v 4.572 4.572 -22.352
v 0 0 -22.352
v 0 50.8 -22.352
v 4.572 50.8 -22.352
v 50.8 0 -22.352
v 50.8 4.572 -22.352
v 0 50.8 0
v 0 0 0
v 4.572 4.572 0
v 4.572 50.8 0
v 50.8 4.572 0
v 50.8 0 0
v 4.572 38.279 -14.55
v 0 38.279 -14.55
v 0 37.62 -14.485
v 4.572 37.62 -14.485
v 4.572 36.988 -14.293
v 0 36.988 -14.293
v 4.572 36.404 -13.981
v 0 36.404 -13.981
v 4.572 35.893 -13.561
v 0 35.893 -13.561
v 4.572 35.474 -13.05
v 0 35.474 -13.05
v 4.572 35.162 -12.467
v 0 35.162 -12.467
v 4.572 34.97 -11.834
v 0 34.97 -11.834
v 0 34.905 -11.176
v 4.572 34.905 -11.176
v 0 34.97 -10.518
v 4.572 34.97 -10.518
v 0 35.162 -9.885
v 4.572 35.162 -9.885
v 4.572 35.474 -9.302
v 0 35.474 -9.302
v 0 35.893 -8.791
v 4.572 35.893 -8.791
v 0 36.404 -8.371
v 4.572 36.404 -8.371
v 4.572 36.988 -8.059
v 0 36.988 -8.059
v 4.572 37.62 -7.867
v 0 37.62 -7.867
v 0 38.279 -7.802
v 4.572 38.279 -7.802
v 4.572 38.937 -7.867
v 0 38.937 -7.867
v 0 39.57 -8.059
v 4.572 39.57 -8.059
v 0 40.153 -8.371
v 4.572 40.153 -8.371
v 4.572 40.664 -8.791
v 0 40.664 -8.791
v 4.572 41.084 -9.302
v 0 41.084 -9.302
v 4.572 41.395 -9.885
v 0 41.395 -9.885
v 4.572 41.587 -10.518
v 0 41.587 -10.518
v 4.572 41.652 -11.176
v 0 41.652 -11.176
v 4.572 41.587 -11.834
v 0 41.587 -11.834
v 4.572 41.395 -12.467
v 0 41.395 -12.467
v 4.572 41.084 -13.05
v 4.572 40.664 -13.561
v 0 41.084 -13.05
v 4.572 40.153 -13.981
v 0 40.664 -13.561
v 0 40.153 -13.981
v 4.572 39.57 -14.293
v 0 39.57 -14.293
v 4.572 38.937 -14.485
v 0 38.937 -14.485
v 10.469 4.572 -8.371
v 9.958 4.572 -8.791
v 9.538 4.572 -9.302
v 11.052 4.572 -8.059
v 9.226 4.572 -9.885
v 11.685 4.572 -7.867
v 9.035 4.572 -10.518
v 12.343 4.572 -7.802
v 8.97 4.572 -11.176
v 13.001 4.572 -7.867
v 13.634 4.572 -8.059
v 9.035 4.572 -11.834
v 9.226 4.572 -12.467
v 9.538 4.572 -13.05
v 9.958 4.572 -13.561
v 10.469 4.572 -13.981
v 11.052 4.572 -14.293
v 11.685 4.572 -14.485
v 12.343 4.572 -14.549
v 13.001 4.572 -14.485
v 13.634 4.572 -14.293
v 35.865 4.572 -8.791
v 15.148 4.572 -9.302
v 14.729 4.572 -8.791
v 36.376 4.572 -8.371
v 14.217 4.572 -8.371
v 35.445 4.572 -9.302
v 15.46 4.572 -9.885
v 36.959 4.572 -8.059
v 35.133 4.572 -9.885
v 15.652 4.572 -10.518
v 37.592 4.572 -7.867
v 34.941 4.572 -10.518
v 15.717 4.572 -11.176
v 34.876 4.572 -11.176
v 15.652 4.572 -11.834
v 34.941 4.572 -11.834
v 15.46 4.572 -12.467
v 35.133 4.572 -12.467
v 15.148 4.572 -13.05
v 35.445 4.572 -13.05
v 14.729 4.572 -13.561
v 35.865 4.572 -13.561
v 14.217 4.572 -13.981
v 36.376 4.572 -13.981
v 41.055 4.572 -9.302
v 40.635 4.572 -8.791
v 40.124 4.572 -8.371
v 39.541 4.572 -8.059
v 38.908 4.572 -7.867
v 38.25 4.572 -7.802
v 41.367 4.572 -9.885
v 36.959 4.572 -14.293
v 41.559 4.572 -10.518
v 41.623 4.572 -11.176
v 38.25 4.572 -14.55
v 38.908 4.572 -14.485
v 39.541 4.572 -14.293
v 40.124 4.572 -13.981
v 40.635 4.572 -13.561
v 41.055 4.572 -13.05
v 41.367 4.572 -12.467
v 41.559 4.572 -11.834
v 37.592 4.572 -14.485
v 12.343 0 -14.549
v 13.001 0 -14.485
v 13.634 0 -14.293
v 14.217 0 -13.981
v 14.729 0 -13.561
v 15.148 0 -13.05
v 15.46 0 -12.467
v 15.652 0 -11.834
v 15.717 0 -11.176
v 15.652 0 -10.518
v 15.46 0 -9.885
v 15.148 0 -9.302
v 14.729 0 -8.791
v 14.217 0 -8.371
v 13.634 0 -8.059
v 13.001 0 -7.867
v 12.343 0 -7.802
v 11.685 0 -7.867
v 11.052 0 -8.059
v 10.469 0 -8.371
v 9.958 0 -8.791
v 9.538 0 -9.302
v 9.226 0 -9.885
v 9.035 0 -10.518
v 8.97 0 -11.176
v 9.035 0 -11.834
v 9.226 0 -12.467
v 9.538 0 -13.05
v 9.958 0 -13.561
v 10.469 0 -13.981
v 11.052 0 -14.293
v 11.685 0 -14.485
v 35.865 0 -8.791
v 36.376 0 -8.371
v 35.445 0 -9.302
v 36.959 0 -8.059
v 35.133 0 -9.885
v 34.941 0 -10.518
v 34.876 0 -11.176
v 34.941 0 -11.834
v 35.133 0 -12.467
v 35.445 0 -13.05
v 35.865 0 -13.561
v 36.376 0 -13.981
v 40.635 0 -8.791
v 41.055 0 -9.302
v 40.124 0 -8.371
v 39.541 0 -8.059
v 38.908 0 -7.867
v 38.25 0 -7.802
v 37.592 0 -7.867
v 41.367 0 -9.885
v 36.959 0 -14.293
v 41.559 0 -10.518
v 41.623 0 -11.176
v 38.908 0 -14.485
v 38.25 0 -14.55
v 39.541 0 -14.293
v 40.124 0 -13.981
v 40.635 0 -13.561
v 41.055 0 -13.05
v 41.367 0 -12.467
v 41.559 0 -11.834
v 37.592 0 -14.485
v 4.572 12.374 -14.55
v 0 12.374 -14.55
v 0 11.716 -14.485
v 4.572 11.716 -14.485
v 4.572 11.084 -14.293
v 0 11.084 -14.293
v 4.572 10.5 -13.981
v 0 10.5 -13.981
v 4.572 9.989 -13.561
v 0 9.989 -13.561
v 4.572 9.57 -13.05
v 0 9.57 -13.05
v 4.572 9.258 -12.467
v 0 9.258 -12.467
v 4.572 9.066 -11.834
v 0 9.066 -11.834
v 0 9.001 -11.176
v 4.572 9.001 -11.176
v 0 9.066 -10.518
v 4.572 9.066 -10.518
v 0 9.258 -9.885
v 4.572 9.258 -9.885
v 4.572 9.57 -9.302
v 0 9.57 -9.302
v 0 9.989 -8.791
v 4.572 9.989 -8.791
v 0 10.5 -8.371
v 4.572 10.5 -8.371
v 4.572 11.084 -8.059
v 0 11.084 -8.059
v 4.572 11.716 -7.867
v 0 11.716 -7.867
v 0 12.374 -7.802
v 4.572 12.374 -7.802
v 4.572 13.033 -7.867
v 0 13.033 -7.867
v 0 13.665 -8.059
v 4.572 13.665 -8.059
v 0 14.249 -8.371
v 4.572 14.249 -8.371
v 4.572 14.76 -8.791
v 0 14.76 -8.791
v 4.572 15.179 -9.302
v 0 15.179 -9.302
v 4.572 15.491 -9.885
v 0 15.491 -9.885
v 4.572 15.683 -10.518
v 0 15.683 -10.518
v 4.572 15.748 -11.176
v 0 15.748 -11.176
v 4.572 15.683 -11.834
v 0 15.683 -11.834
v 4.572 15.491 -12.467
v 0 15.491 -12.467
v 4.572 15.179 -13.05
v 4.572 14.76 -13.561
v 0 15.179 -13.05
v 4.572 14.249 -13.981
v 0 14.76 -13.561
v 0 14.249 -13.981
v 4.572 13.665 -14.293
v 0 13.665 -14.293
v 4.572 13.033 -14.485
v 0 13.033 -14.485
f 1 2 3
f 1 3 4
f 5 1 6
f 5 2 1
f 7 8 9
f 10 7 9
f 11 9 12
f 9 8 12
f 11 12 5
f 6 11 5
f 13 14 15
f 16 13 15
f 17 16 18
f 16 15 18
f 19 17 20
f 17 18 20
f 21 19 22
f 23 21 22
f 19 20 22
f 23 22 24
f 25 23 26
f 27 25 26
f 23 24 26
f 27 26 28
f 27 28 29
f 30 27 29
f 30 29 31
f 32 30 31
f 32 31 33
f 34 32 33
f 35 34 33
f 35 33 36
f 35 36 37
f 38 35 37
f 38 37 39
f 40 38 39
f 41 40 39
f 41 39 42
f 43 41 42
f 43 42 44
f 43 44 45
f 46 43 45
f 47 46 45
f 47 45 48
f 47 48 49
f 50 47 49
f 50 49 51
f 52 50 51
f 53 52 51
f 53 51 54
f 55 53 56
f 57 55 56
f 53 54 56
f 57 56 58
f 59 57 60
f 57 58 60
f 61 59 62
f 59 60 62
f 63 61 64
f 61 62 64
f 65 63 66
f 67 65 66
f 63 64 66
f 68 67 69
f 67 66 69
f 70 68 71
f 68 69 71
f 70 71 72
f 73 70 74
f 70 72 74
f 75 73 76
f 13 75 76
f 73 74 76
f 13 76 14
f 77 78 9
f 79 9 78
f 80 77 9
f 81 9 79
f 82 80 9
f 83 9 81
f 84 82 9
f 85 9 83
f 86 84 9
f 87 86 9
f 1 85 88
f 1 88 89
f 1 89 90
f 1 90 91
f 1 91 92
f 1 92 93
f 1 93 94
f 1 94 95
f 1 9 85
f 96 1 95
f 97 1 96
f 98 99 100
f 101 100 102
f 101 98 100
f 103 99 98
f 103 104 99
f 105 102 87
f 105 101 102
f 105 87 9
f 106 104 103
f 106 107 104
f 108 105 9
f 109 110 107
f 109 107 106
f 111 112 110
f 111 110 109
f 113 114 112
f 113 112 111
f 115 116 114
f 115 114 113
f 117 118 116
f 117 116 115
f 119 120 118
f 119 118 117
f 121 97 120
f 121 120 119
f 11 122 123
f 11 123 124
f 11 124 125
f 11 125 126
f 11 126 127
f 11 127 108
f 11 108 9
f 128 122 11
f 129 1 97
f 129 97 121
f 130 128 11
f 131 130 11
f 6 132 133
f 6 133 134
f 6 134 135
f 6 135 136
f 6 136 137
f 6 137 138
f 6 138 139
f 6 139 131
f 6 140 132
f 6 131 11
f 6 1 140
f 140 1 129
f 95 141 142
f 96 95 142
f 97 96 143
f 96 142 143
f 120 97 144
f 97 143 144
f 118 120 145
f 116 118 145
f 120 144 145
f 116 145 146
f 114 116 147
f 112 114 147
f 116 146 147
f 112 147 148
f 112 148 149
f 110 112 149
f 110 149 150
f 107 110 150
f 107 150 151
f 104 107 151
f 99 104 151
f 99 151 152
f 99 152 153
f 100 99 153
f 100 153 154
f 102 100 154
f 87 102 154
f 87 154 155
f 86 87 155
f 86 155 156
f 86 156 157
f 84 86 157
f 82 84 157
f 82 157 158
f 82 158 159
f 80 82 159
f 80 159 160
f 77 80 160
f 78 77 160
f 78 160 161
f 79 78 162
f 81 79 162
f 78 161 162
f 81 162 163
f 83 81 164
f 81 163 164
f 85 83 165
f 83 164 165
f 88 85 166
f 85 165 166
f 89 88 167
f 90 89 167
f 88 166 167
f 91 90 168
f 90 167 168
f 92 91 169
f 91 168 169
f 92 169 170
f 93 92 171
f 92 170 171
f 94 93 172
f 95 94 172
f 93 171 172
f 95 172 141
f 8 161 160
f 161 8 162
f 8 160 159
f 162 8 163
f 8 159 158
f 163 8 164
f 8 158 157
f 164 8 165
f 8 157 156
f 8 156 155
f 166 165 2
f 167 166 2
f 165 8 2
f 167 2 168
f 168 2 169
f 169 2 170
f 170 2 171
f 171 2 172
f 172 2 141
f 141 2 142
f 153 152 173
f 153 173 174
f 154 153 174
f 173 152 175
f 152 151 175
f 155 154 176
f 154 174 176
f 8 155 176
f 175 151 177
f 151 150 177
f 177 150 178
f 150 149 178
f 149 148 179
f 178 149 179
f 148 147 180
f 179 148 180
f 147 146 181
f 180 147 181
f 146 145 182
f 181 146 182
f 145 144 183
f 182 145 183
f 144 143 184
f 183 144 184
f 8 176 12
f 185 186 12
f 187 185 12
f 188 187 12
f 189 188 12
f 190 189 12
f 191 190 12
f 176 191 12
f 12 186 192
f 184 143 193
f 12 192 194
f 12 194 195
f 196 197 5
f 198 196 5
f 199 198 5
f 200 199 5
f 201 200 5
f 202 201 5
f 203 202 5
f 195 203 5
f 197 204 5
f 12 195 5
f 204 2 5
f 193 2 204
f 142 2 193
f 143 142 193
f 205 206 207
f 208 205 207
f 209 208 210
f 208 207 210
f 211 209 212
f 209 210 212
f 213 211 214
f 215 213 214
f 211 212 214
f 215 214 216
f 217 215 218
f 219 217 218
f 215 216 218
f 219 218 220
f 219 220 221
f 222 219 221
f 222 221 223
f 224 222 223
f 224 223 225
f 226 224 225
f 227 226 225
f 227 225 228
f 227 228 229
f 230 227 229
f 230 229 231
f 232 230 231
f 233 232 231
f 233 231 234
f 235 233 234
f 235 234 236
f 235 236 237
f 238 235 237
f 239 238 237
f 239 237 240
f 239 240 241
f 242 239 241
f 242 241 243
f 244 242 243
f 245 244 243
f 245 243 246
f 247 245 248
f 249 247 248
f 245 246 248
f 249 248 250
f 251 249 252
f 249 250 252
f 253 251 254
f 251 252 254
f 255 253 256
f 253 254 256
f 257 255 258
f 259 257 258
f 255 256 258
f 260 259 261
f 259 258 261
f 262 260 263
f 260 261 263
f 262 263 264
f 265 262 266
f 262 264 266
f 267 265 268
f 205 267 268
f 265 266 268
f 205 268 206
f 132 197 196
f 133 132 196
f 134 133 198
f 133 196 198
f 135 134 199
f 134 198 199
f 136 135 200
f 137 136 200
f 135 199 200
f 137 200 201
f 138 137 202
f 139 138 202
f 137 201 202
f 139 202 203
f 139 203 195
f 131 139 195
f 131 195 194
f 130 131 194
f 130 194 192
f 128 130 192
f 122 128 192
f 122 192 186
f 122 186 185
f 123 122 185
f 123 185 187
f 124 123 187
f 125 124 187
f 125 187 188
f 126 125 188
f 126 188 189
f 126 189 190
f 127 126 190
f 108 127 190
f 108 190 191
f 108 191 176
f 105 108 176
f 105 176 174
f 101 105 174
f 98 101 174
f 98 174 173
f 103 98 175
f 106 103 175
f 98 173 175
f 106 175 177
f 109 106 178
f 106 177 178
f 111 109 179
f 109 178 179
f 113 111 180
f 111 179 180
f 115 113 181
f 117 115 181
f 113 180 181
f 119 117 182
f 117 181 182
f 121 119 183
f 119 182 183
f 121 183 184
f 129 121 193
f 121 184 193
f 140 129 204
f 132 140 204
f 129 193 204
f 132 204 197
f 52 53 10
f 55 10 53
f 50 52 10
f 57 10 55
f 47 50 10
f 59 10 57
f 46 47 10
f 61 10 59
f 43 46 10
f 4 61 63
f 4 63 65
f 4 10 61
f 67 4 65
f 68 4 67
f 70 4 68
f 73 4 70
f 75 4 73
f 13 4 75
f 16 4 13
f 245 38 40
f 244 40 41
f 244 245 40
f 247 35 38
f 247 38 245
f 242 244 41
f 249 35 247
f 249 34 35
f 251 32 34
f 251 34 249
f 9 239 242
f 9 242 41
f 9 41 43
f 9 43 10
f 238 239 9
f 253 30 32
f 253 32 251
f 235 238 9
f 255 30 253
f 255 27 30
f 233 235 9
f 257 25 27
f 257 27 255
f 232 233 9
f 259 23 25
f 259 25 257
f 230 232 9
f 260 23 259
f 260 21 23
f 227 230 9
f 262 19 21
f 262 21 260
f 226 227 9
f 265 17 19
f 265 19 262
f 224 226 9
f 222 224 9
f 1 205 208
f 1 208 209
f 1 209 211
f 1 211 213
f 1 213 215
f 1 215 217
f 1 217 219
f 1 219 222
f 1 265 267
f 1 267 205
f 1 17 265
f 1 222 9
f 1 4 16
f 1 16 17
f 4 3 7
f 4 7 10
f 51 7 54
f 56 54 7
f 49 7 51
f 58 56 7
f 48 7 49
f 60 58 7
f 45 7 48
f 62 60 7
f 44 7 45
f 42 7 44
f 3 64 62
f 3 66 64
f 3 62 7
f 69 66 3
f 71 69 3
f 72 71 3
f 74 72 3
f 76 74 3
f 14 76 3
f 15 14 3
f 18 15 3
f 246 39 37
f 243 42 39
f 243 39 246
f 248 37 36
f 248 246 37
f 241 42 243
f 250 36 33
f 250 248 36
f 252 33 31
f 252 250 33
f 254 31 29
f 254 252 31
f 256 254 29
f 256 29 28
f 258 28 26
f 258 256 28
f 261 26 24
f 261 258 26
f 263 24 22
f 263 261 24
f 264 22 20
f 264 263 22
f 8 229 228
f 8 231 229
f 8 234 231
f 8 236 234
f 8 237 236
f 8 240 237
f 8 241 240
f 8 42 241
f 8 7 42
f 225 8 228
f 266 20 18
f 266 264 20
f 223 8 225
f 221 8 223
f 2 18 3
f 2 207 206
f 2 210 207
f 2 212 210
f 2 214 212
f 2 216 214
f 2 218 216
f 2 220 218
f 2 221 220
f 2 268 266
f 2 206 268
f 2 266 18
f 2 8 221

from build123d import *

# Parameters (mm, degrees)
SKETCH1_W                                  = 50.8
SKETCH1_H                                  = 22.352
BOSS_EXTRUDE1_DEPTH                        = 50.8
CUT_EXTRUDE2_DEPTH                         = 76.238898876
CUT_EXTRUDE2_DEPTH_BACK                    = 76.238898876
F_17_64_0_26563_DIAMETER_HOLE1_D           = 6.747002
F_17_64_0_26563_DIAMETER_HOLE1_ON_FACE_2_D = 6.747002


with BuildPart() as part:
    # Sketch1 → Boss-Extrude1 (new body)
    with BuildSketch(Plane(origin=(0, 0, 0), x_dir=(1, 0, 0), z_dir=(0, 1, 0))):
        with Locations((25.4, 11.176)):
            Rectangle(SKETCH1_W, SKETCH1_H)
    extrude(amount=BOSS_EXTRUDE1_DEPTH)

    # Sketch2 → Cut-Extrude2 (cut, two sides: drawn at the far end of the back side and taken through both)
    with BuildSketch(Plane.XY.offset(-CUT_EXTRUDE2_DEPTH_BACK)):
        Polygon((4.572, 198.1705643), (4.572, 50.8), (4.572, 4.572), (50.8, 4.572), (198.1705643, 4.572), (406.584015027, 212.985450727), (212.985450727, 406.584015027), align=None)
    extrude(amount=CUT_EXTRUDE2_DEPTH + CUT_EXTRUDE2_DEPTH_BACK, mode=Mode.SUBTRACT)

    # 17/64 (0.26563) Diameter Hole1 (through all)
    with Locations(Plane(origin=(4.572, 12.374496691, -11.175999046), x_dir=(0, 0, 1), z_dir=(1, 0, 0))):
        with Locations((0, 0), (-9.54e-07, -25.904093129)):
            Hole(F_17_64_0_26563_DIAMETER_HOLE1_D / 2)

    # 17/64 (0.26563) Diameter Hole1 on face 2 (through all)
    with Locations(Plane(origin=(12.343199837, 4.572, -11.175998262), x_dir=(0, 0, 1), z_dir=(0, 1, 0))):
        with Locations((0, 0), (-1.738e-06, 25.906798937)):
            Hole(F_17_64_0_26563_DIAMETER_HOLE1_ON_FACE_2_D / 2)


solid = part.part
